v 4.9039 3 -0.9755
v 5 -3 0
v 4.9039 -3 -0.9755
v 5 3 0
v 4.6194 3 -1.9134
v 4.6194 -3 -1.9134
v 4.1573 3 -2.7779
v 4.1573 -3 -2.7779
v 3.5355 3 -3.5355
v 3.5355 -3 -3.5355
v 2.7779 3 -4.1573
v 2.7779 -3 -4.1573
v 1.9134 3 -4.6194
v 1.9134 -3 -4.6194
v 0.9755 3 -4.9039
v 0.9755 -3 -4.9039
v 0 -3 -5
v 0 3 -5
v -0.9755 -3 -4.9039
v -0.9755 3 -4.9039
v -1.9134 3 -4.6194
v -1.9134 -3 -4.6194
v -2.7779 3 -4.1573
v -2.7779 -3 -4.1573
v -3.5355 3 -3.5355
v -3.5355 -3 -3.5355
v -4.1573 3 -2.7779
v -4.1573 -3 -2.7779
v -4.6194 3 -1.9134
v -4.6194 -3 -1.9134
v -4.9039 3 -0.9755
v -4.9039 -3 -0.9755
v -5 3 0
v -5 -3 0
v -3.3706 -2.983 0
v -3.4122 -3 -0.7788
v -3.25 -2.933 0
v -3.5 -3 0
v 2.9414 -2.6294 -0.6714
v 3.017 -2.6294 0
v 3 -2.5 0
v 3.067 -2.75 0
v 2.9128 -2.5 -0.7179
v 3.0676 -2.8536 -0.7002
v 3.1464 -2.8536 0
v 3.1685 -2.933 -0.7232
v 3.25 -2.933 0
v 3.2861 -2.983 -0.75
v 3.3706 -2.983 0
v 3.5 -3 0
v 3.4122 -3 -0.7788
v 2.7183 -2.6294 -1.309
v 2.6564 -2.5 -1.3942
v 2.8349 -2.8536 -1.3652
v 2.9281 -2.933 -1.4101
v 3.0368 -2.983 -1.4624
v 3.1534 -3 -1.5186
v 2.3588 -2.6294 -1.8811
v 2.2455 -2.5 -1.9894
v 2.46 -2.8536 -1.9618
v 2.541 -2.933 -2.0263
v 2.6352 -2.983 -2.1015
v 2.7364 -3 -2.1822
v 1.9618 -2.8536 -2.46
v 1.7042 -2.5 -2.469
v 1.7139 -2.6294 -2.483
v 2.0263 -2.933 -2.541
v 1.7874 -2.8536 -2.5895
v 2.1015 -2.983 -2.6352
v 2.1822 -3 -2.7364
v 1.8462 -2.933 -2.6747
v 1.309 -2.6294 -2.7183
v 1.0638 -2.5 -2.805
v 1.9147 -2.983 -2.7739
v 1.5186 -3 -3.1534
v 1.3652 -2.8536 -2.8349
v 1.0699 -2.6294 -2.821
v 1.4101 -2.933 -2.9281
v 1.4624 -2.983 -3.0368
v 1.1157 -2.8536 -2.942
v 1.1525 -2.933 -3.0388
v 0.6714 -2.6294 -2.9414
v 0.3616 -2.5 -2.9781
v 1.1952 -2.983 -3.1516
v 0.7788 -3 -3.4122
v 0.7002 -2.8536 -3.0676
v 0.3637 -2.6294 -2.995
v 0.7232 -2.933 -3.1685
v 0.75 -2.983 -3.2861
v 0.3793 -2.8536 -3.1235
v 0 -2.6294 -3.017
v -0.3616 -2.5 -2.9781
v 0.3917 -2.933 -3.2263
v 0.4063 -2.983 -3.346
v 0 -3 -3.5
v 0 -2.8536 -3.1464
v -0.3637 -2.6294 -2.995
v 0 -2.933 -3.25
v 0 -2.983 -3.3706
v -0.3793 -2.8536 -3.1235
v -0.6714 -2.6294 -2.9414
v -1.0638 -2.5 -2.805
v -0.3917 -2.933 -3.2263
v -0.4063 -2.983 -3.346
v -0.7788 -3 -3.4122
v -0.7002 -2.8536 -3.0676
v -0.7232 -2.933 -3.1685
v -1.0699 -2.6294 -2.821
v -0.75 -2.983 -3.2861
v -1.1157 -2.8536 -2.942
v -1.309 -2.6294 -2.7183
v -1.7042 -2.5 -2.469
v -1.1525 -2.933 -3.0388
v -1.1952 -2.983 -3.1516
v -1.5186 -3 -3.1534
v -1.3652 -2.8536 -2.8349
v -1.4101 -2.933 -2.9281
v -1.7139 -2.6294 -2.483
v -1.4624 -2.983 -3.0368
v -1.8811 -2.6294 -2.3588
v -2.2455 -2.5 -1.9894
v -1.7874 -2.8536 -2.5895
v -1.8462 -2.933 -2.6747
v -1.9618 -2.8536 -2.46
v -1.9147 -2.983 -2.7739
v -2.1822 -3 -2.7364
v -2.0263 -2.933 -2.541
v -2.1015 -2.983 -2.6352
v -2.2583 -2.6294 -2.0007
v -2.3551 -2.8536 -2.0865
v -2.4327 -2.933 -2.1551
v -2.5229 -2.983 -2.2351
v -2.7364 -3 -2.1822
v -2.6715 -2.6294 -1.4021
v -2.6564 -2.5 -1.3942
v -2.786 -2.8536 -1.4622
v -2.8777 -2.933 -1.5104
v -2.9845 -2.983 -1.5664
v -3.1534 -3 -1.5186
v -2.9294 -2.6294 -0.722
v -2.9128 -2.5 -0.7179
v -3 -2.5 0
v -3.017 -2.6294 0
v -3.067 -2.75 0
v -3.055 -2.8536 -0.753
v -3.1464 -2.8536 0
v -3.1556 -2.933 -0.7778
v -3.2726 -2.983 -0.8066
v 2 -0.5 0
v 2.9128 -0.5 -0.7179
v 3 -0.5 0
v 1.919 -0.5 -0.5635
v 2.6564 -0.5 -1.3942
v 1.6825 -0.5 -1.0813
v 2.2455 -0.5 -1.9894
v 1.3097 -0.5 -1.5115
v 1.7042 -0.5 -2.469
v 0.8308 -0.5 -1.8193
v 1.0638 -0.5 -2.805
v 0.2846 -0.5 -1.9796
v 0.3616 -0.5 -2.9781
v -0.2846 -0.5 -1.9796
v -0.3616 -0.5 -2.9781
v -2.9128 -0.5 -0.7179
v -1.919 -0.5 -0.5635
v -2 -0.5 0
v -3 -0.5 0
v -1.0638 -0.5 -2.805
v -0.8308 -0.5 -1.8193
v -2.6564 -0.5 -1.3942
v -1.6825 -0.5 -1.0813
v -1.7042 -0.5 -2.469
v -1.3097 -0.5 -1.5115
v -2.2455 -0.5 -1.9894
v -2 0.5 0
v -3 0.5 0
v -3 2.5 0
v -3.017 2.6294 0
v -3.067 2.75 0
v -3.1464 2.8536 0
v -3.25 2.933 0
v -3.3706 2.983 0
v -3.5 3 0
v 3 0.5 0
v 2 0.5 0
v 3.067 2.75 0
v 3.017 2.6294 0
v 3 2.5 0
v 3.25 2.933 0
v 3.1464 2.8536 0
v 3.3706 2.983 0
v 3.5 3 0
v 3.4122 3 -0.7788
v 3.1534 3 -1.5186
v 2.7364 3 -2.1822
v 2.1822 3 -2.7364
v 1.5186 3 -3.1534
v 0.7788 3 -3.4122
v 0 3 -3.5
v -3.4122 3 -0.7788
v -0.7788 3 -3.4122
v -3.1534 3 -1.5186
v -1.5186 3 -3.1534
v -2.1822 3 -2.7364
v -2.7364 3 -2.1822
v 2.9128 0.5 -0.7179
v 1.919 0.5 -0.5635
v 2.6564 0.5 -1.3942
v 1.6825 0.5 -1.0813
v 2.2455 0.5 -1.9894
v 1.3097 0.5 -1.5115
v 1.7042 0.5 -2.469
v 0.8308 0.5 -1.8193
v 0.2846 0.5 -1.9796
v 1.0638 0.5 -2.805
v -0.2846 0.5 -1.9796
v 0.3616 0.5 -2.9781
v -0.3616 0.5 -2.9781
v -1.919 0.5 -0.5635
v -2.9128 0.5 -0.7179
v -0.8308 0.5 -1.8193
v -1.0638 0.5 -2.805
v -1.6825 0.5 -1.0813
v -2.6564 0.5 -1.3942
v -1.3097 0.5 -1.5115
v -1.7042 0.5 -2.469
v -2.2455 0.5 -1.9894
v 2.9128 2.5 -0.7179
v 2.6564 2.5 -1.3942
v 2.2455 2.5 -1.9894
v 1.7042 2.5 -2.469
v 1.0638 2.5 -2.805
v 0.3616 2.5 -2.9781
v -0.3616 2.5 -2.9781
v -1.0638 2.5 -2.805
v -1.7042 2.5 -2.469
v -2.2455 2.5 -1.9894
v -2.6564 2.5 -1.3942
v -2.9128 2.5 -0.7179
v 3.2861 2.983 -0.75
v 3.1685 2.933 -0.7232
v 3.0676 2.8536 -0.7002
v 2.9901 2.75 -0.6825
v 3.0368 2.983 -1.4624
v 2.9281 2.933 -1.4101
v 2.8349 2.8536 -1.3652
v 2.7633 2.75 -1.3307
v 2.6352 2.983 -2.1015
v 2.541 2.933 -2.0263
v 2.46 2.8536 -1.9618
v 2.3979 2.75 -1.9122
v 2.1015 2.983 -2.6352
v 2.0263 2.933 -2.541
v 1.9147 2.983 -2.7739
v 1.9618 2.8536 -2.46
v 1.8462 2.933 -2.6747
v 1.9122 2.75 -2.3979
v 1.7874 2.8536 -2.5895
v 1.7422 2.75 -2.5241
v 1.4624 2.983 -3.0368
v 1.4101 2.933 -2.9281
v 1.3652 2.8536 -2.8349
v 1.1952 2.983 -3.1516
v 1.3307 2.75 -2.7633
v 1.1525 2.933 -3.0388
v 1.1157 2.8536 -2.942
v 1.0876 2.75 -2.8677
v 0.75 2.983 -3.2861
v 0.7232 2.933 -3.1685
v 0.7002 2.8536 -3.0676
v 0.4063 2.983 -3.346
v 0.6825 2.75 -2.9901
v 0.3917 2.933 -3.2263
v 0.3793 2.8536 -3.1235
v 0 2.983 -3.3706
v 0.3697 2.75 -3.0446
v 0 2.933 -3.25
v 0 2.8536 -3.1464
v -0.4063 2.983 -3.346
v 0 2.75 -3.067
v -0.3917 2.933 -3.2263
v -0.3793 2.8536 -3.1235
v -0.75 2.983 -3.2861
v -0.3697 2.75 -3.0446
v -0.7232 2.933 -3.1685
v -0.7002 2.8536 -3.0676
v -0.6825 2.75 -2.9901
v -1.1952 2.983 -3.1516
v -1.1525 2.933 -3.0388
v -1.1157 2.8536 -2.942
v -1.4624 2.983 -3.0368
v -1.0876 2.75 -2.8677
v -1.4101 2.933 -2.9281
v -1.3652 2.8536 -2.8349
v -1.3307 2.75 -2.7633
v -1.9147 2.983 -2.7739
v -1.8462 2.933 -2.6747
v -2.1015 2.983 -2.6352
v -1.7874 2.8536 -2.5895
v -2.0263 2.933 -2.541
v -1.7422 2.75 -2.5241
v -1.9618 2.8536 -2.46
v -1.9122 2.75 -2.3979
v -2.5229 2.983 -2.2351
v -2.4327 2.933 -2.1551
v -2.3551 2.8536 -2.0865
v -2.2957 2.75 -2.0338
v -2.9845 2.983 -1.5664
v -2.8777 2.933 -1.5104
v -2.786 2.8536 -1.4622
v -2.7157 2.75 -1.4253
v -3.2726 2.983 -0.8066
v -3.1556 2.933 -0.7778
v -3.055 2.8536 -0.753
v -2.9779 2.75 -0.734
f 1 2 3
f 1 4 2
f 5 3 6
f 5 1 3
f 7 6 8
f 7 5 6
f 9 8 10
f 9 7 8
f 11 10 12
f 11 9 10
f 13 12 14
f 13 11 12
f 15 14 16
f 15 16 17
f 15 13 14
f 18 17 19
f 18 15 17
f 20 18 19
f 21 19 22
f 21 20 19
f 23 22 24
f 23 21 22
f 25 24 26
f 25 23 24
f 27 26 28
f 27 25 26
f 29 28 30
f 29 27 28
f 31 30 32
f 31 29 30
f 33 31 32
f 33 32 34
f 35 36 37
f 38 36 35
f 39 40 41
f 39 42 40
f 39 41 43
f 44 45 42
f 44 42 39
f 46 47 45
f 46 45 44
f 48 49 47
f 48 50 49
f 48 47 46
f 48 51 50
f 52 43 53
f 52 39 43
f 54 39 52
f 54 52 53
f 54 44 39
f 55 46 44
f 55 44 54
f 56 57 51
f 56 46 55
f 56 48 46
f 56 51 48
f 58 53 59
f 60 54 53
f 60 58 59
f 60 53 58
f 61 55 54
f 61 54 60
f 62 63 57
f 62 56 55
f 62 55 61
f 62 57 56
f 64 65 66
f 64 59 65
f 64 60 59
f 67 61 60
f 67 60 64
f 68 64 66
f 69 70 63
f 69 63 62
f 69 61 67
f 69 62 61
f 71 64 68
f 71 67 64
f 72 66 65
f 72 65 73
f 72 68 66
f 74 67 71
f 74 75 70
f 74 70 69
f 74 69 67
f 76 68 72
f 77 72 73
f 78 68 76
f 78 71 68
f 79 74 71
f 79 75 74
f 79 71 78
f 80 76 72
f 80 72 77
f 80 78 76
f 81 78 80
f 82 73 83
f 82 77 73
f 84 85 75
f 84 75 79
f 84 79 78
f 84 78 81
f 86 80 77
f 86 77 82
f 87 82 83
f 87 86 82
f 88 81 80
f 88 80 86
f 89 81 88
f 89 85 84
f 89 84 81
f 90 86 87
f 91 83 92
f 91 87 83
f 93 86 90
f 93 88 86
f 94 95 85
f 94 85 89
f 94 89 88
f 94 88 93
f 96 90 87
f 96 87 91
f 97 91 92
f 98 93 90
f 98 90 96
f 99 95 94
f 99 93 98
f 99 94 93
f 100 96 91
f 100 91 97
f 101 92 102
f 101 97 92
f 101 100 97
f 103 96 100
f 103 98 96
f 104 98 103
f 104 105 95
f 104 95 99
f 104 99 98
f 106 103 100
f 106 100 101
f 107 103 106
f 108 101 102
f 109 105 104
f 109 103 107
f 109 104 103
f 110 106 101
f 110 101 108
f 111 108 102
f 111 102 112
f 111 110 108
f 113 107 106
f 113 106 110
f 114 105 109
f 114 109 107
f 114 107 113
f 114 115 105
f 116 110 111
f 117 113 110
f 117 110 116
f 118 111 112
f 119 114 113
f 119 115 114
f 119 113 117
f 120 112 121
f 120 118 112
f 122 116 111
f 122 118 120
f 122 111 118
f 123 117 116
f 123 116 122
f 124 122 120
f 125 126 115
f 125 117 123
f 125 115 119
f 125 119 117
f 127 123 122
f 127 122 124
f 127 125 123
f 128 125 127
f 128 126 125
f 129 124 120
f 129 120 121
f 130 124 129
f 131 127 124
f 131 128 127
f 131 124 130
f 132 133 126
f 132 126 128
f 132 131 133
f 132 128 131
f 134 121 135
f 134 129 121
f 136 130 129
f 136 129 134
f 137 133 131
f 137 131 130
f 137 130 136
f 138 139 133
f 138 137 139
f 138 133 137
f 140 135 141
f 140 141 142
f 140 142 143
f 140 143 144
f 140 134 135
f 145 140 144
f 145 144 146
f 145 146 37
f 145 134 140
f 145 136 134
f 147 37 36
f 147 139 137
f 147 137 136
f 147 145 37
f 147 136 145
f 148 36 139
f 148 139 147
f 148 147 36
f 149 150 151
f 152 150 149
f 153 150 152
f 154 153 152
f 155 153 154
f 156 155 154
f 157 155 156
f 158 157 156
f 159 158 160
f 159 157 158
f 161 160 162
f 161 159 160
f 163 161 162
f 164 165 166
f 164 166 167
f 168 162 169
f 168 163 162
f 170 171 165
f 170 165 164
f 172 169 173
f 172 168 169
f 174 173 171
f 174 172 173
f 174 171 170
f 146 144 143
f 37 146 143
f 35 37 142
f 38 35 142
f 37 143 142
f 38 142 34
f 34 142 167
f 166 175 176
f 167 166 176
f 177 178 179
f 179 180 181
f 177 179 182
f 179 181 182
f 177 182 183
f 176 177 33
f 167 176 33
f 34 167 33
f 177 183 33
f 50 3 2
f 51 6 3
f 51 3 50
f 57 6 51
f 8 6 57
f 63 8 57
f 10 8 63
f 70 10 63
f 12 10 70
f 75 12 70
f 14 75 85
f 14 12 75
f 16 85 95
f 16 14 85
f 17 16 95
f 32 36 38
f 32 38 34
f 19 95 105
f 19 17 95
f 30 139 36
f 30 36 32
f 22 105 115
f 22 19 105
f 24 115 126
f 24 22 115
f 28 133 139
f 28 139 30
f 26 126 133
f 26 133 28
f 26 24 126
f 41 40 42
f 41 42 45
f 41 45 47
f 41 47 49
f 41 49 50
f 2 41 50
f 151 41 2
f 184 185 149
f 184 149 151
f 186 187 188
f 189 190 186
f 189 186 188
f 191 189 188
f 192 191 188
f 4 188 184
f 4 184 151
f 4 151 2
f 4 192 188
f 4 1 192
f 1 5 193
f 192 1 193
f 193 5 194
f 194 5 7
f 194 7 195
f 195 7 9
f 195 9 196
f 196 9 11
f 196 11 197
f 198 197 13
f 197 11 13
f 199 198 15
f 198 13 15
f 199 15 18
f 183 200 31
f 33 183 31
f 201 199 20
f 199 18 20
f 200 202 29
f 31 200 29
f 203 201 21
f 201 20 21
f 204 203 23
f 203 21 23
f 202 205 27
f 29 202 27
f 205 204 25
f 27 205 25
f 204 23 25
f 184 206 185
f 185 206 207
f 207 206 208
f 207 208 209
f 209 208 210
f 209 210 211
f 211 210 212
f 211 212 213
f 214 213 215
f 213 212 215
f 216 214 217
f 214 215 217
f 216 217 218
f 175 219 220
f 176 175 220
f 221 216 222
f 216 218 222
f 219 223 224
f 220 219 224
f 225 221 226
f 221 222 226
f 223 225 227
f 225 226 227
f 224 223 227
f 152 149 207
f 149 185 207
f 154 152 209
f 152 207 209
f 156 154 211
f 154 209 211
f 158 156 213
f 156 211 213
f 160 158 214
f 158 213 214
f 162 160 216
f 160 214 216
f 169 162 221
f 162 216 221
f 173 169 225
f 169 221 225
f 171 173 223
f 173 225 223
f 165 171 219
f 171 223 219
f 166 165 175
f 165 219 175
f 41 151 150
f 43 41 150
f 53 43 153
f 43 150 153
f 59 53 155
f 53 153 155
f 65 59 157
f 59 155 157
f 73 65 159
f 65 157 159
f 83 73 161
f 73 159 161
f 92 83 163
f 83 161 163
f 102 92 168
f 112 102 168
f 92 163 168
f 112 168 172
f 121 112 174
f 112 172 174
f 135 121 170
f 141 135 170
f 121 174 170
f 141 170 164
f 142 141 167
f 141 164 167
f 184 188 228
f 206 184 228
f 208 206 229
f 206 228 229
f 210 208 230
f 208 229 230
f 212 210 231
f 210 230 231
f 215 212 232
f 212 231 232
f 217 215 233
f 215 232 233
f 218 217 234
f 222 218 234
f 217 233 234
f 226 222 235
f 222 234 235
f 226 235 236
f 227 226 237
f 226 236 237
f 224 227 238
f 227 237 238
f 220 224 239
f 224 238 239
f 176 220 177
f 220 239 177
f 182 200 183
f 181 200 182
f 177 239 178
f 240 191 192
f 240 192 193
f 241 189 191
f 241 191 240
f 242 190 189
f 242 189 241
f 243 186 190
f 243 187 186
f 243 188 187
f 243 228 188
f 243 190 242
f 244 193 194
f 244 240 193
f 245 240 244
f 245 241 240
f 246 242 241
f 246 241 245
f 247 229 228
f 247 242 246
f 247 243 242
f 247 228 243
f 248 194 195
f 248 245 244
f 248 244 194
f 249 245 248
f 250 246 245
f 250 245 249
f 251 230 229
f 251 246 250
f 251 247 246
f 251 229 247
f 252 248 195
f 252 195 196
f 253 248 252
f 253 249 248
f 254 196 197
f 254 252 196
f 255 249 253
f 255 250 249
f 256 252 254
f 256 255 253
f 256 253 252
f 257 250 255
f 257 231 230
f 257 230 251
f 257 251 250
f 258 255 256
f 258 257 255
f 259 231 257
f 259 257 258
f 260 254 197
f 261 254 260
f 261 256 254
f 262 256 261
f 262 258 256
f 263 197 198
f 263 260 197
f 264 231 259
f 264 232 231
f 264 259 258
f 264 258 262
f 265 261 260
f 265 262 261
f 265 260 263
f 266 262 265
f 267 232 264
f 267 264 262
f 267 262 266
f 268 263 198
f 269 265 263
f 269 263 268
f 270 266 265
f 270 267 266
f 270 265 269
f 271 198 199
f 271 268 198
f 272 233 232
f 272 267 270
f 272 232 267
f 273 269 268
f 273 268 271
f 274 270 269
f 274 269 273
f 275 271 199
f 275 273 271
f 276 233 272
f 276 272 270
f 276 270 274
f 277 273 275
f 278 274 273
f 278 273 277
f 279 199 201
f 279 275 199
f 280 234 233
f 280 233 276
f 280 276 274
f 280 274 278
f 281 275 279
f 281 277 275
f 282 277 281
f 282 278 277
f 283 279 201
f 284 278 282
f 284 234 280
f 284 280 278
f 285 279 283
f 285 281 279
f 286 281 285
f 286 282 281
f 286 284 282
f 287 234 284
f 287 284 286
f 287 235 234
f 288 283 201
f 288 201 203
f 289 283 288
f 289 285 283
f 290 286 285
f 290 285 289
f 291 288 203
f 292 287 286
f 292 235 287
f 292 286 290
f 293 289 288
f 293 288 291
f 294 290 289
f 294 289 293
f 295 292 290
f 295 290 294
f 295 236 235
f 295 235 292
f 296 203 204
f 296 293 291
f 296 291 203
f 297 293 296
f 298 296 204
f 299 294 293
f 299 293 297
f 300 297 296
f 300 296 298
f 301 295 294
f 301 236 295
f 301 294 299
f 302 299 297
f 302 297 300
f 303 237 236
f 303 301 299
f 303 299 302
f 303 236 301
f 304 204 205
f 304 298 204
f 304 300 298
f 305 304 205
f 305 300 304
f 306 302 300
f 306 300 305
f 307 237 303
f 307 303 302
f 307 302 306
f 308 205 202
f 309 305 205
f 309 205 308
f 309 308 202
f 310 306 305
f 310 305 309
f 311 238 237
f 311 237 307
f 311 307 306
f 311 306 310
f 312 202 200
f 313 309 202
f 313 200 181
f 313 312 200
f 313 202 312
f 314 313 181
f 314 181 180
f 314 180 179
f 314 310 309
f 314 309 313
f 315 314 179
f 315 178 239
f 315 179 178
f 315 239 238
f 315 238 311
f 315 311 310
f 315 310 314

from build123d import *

# Parameters (mm, degrees)
SKETCH1_W      = 1
SKETCH1_H      = 1
SKETCH1_W_2    = 2
SKETCH1_H_2    = 6
REVOLVE2_ANGLE = 180
FILLET3_R      = 0.5


with BuildPart() as part:
    # Sketch1 → Revolve2 (revolve)
    with BuildSketch(Plane.XY):
        with Locations((2.5, 0)):
            Rectangle(SKETCH1_W, SKETCH1_H)
        with Locations((4, 0)):
            Rectangle(SKETCH1_W_2, SKETCH1_H_2)
    revolve(axis=Axis((0, 0, 0), (0, 1, 0)), revolution_arc=REVOLVE2_ANGLE)

    # Fillet3
    fillet3_edges = [part.edges().sort_by_distance(p)[0] for p in [
        (0, 3, -3),
        (0, -3, -3),
    ]]
    fillet(fillet3_edges, radius=FILLET3_R)


solid = part.part
